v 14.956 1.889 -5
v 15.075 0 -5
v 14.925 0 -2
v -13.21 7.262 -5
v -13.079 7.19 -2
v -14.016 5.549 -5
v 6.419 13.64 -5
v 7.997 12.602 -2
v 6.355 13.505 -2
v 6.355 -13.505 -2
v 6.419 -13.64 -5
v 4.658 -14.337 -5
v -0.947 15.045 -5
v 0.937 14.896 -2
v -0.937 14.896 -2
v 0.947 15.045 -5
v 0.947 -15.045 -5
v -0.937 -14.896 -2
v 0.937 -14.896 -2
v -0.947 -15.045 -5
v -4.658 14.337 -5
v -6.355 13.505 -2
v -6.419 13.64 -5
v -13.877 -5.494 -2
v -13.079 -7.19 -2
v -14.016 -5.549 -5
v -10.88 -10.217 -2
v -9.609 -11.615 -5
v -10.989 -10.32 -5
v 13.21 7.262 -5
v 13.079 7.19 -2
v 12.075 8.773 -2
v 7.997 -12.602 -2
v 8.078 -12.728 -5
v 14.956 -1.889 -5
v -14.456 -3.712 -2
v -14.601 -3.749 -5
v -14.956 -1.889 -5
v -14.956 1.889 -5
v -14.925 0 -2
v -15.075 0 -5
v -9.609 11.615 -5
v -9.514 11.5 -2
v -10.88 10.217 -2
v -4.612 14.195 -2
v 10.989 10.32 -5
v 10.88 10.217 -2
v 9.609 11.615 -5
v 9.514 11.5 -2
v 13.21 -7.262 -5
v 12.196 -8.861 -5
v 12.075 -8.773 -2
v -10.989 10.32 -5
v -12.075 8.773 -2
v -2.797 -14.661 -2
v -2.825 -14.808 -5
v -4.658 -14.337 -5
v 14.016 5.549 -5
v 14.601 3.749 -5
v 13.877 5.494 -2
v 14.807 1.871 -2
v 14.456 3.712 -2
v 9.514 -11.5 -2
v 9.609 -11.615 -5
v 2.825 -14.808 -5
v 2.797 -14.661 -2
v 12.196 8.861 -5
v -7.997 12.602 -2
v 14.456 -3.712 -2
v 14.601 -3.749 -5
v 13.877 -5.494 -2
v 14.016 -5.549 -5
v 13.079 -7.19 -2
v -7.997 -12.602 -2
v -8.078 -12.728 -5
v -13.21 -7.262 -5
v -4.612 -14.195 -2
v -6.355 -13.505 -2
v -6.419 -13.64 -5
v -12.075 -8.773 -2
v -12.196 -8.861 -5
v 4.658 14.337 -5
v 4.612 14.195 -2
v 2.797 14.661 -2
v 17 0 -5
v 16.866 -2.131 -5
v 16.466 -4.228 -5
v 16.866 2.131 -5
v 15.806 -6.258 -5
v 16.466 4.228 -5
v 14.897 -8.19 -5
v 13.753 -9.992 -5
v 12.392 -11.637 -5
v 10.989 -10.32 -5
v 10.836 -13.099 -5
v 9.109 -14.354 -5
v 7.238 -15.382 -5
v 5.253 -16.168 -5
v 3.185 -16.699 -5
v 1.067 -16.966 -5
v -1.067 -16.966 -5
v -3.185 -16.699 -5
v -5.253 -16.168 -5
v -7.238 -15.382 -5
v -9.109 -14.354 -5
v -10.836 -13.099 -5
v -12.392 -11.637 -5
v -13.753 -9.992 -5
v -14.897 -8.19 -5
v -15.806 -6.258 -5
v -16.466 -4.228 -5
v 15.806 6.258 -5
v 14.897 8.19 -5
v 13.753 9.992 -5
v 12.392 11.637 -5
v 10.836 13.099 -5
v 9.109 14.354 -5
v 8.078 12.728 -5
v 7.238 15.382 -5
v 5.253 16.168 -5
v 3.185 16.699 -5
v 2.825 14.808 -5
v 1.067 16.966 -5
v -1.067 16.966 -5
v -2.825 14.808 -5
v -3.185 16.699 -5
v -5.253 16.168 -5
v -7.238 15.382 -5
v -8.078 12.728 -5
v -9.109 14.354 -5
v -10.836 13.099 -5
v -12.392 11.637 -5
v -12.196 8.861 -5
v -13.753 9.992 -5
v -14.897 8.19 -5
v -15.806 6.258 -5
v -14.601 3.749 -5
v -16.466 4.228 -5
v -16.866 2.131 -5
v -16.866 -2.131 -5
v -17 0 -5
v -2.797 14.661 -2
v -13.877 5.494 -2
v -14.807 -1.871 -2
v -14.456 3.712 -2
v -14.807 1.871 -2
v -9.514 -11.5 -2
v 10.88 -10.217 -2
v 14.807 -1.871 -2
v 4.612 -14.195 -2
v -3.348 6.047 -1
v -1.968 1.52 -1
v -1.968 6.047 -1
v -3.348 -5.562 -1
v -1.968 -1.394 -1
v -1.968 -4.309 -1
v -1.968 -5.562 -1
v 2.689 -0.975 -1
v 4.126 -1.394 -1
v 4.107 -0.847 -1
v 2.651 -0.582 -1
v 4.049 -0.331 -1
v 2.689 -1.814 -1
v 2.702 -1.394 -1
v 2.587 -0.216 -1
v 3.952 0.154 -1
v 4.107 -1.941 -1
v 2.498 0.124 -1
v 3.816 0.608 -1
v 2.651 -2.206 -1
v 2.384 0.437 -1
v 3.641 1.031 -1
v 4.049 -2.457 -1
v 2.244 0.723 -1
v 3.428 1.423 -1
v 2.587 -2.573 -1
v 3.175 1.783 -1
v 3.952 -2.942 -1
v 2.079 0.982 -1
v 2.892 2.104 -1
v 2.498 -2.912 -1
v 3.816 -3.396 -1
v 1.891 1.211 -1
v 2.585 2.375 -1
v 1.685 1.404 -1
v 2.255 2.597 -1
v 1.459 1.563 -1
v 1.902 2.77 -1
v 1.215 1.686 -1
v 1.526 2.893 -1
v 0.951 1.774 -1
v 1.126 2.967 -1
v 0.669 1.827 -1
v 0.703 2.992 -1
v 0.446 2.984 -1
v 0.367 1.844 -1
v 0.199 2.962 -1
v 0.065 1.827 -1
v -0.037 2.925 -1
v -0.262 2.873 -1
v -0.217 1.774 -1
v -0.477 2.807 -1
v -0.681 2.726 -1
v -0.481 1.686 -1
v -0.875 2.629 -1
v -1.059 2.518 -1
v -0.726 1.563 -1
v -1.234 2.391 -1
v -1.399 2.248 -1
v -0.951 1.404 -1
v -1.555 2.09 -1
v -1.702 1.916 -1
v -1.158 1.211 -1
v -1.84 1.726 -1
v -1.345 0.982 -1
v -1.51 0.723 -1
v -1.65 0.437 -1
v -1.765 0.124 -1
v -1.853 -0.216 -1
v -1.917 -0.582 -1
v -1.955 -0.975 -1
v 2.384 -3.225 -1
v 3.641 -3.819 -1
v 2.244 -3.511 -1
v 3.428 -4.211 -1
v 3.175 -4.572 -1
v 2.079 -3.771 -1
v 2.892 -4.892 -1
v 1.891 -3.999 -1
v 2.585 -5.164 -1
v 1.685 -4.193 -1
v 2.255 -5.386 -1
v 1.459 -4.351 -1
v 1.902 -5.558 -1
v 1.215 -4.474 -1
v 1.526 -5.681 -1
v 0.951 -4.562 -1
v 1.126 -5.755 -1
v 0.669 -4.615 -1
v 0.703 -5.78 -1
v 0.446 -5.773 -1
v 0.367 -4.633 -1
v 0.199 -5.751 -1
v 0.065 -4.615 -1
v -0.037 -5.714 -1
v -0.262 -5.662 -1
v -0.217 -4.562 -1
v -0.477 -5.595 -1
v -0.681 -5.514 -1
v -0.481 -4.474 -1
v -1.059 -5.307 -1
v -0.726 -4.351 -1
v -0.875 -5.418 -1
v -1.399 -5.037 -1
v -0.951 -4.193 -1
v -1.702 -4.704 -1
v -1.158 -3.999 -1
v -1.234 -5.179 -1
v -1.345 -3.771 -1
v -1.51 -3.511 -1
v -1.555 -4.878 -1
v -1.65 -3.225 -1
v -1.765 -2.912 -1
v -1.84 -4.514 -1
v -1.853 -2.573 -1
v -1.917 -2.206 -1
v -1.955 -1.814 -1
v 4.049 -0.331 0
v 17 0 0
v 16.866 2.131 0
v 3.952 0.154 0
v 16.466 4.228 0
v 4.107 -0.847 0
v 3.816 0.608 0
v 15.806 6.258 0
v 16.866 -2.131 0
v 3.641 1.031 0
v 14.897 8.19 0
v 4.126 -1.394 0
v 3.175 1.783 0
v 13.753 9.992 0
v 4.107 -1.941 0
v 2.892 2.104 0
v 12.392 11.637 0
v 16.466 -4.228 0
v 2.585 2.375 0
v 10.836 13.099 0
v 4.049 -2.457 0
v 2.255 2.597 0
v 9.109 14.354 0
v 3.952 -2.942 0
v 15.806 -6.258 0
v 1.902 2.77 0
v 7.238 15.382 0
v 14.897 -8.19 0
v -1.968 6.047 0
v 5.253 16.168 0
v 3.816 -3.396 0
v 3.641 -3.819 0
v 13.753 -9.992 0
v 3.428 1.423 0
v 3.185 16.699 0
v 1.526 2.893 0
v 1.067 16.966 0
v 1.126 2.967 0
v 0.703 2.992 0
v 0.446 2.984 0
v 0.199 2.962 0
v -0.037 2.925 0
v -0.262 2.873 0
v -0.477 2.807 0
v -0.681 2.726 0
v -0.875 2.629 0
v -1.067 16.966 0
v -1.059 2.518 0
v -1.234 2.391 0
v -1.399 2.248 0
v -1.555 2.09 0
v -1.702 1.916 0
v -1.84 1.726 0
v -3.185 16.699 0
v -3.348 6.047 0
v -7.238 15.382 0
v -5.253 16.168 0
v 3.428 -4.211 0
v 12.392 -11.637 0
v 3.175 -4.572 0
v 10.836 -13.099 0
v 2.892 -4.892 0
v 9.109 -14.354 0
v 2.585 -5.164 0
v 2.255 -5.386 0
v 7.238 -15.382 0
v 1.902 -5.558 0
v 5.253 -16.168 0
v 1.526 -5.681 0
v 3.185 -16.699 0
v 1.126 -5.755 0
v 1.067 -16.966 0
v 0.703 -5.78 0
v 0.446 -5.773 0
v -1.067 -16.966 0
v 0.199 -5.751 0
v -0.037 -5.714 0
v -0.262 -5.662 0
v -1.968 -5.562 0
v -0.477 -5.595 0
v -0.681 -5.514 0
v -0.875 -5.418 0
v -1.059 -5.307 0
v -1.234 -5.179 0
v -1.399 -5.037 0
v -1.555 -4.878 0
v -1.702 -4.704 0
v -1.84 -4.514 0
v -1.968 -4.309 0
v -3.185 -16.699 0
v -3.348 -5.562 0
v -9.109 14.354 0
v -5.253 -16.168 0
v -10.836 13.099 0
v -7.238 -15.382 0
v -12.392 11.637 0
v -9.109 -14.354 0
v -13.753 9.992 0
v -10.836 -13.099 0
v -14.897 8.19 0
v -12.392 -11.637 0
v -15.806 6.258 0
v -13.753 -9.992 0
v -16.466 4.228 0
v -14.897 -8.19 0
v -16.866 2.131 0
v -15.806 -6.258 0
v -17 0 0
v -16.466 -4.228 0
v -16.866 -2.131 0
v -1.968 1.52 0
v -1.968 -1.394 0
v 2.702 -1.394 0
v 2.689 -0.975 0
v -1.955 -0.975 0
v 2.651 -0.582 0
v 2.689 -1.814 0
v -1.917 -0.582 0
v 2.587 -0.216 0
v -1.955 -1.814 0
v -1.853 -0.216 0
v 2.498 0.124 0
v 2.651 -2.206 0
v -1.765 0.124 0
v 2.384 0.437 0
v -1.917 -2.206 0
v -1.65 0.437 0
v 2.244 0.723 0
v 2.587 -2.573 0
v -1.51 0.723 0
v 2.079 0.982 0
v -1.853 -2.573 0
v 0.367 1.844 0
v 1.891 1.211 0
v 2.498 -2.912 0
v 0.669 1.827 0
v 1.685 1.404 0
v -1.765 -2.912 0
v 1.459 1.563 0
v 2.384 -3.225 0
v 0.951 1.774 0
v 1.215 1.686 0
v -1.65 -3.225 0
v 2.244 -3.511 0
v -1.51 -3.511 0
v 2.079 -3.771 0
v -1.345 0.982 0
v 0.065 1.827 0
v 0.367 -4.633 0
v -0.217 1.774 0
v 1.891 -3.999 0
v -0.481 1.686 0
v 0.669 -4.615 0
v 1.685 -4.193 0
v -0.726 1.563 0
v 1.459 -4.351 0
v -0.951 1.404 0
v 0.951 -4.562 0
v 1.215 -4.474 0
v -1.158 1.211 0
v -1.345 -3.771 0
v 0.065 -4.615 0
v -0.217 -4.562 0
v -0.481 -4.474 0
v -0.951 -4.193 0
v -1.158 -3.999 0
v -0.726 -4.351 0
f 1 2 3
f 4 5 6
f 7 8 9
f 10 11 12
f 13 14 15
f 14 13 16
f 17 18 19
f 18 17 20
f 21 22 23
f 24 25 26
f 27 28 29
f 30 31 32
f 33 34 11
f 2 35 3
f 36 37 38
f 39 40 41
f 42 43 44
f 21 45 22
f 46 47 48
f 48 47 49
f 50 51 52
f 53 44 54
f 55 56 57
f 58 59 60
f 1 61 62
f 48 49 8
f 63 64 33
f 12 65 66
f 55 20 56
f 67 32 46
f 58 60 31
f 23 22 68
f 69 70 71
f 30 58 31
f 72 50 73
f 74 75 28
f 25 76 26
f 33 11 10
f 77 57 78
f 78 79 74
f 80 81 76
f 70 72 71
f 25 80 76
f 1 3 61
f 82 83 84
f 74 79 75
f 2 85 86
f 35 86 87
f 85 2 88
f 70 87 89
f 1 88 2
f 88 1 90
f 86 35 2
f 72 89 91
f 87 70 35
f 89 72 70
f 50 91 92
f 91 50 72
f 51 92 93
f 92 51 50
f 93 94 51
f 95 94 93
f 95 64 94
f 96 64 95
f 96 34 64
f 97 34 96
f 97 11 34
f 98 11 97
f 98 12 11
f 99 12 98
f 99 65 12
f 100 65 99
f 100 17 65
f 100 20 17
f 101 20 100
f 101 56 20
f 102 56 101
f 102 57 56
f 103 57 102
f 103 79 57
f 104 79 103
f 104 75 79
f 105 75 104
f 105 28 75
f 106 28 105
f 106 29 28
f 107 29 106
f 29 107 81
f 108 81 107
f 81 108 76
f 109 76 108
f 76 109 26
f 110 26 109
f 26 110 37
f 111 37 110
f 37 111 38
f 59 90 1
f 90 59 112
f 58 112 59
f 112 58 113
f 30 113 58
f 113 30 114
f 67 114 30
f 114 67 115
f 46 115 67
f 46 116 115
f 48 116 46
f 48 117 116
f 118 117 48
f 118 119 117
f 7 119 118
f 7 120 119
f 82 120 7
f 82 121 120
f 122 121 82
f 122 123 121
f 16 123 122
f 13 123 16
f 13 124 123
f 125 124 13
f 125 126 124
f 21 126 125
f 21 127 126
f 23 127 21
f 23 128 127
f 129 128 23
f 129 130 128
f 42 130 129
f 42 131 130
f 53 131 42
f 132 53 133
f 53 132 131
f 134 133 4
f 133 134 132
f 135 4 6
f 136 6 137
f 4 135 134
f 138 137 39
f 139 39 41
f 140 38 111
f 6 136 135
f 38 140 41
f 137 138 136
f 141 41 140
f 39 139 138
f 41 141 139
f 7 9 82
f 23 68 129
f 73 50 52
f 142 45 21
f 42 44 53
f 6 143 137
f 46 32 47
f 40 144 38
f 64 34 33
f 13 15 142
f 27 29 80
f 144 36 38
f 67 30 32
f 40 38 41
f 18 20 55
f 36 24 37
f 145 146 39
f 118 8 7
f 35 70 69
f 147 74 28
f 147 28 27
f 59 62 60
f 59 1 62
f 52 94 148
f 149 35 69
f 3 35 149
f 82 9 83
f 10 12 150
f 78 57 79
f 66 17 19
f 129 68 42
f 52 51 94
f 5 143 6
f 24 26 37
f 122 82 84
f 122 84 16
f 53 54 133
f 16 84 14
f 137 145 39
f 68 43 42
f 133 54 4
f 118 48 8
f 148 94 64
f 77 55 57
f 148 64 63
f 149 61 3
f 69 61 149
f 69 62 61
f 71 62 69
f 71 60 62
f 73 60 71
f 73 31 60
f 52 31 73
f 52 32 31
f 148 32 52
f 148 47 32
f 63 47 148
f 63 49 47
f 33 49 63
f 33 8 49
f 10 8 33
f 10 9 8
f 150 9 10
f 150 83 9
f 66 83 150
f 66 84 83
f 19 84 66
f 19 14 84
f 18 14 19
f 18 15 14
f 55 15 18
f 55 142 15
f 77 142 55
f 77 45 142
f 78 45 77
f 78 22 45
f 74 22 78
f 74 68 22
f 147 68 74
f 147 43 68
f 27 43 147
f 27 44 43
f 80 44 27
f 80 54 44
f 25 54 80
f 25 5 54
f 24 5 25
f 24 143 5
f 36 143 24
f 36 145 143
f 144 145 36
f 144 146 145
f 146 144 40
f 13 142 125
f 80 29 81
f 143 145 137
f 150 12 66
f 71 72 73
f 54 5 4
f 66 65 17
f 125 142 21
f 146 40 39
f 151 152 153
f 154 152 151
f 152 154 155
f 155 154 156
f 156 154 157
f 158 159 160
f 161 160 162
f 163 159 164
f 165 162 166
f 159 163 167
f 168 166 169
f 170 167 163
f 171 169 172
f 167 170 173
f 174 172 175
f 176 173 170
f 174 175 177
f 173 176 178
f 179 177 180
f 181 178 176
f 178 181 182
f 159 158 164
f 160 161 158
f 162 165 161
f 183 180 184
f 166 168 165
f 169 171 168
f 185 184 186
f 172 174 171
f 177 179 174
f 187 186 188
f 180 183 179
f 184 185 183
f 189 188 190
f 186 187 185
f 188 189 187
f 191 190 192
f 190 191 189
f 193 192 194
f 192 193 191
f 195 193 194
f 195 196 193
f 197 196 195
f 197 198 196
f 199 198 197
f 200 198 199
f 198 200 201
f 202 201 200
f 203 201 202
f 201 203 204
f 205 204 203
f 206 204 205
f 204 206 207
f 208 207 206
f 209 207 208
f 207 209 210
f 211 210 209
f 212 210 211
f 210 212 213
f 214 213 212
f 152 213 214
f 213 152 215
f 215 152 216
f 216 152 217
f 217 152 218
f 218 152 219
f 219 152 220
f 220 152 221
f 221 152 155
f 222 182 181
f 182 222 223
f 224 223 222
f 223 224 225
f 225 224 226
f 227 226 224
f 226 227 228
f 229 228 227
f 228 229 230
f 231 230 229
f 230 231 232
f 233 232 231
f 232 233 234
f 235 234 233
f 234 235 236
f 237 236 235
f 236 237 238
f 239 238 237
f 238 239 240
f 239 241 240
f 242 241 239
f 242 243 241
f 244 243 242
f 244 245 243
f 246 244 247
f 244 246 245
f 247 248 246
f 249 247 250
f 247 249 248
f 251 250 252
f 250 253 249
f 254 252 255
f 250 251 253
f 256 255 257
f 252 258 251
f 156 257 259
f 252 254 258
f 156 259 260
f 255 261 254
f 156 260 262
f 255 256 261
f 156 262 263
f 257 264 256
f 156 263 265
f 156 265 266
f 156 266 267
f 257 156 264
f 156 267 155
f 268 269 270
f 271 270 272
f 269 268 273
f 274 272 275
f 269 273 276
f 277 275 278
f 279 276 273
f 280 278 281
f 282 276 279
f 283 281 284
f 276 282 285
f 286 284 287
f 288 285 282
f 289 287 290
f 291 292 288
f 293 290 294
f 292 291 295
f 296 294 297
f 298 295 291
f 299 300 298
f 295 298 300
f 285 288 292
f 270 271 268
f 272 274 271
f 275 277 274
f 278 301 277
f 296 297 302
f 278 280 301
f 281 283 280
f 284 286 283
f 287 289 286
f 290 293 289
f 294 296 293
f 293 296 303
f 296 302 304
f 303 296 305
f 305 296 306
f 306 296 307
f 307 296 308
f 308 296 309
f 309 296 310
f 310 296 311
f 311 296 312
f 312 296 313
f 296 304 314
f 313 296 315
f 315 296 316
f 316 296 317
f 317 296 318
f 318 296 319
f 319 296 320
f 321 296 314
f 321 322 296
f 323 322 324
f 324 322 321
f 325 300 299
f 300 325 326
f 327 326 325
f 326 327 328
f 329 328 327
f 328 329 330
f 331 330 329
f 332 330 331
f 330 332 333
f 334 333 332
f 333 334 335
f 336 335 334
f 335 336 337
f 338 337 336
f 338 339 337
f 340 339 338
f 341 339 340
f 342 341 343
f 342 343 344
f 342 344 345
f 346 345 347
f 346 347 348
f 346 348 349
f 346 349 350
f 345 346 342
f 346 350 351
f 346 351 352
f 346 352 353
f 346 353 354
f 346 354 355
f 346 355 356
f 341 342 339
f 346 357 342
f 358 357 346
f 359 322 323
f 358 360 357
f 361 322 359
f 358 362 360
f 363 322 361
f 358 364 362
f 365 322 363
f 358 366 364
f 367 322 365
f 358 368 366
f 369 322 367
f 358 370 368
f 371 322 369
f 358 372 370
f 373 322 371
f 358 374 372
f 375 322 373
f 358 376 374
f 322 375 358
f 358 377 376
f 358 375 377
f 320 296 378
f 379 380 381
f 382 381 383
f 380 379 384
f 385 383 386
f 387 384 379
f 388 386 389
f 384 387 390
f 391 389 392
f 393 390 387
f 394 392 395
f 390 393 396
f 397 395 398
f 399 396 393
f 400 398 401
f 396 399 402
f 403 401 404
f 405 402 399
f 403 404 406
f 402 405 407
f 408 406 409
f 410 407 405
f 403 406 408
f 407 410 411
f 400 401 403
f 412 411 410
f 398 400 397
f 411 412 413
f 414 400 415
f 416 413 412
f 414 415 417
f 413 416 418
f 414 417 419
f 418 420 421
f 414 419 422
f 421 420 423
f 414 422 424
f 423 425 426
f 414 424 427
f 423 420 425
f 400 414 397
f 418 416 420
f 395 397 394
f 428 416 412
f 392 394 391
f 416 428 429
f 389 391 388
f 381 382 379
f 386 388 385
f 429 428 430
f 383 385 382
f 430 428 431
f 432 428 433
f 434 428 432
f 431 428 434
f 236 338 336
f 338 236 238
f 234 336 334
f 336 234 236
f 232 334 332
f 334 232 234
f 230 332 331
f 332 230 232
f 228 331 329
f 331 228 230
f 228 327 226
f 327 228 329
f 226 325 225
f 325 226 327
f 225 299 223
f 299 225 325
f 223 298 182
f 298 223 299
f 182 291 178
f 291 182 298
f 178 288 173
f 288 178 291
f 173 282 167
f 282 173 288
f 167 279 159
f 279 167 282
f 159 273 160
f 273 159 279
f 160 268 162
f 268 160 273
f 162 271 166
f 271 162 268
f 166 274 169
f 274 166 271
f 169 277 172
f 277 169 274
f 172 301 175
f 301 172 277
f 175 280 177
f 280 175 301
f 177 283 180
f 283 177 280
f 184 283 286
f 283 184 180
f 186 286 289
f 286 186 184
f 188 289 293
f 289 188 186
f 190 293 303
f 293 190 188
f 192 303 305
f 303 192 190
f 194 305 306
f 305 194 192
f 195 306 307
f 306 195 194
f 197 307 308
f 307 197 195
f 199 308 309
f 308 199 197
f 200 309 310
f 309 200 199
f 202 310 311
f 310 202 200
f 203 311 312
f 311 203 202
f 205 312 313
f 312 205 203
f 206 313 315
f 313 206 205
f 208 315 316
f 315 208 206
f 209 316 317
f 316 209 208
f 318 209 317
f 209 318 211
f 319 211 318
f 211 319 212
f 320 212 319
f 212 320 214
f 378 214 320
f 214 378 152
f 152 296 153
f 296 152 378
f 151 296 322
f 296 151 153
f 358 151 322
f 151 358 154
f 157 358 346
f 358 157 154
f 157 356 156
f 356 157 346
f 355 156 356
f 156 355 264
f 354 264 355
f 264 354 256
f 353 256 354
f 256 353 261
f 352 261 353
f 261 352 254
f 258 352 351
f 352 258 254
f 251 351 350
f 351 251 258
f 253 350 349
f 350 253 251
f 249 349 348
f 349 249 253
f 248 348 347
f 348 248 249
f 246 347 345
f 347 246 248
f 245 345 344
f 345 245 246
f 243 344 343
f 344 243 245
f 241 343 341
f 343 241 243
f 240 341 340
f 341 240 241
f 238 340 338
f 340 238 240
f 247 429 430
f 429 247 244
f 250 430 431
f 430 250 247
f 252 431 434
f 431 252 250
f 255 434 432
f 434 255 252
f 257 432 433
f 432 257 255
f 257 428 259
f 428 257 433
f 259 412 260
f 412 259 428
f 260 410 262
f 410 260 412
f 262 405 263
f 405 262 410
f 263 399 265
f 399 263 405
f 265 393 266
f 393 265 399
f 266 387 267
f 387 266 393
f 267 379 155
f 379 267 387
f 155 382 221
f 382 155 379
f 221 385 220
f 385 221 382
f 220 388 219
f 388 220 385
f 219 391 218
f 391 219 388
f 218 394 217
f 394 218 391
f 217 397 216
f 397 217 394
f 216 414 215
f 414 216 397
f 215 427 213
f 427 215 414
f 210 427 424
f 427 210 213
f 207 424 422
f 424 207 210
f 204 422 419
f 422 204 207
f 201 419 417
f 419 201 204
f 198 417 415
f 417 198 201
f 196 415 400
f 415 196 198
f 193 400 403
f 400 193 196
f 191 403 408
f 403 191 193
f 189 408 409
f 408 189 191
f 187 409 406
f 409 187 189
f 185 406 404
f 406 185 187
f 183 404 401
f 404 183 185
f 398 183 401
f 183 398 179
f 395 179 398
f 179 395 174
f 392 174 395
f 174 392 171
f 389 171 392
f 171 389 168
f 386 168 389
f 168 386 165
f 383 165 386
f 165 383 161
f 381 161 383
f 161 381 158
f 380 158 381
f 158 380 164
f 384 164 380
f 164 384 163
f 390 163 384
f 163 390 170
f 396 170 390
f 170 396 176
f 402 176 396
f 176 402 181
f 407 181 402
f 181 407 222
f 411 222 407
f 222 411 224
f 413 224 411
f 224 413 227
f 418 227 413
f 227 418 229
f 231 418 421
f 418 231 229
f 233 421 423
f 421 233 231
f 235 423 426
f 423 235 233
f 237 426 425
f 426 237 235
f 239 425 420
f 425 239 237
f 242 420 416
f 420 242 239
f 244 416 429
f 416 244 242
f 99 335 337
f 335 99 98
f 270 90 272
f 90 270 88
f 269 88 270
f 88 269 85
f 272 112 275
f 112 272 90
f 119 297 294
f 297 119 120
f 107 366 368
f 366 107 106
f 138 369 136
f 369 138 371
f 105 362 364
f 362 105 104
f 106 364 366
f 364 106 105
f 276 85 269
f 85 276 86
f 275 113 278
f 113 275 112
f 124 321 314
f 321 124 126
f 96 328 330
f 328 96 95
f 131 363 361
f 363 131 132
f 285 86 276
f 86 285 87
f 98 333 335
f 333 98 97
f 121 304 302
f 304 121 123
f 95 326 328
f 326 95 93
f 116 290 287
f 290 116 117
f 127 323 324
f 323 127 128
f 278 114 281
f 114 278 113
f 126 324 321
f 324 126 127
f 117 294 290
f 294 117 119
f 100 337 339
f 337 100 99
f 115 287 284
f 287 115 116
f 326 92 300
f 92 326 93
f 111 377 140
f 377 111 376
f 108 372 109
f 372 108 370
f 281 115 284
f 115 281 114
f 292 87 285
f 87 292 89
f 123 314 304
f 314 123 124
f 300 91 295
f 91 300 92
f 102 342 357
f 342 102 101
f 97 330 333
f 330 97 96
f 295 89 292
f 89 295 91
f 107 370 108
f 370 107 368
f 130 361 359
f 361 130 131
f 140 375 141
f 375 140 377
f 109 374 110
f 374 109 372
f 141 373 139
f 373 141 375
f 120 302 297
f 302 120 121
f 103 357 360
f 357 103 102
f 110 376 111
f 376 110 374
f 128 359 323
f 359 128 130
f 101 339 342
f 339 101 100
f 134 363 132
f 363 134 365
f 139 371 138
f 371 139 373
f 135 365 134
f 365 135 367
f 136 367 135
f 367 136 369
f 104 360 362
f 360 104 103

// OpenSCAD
$fn = 50;

difference() {
	union() {
		translate(v = [0, 0, -5.0]) {
			cylinder(h = 5, r = 17.0);
		}
	}
	union() {
		#translate(v = [0, 0, -5.0]) {
			cylinder(h = 3, r1 = 15.075, r2 = 14.925);
		}
		translate(v = [0, 0, -1]) {
			linear_extrude(height = 1) {
				text(font = "Webdings", halign = "center", size = 11, text = "b", valign = "center");
			}
		}
	}
}
